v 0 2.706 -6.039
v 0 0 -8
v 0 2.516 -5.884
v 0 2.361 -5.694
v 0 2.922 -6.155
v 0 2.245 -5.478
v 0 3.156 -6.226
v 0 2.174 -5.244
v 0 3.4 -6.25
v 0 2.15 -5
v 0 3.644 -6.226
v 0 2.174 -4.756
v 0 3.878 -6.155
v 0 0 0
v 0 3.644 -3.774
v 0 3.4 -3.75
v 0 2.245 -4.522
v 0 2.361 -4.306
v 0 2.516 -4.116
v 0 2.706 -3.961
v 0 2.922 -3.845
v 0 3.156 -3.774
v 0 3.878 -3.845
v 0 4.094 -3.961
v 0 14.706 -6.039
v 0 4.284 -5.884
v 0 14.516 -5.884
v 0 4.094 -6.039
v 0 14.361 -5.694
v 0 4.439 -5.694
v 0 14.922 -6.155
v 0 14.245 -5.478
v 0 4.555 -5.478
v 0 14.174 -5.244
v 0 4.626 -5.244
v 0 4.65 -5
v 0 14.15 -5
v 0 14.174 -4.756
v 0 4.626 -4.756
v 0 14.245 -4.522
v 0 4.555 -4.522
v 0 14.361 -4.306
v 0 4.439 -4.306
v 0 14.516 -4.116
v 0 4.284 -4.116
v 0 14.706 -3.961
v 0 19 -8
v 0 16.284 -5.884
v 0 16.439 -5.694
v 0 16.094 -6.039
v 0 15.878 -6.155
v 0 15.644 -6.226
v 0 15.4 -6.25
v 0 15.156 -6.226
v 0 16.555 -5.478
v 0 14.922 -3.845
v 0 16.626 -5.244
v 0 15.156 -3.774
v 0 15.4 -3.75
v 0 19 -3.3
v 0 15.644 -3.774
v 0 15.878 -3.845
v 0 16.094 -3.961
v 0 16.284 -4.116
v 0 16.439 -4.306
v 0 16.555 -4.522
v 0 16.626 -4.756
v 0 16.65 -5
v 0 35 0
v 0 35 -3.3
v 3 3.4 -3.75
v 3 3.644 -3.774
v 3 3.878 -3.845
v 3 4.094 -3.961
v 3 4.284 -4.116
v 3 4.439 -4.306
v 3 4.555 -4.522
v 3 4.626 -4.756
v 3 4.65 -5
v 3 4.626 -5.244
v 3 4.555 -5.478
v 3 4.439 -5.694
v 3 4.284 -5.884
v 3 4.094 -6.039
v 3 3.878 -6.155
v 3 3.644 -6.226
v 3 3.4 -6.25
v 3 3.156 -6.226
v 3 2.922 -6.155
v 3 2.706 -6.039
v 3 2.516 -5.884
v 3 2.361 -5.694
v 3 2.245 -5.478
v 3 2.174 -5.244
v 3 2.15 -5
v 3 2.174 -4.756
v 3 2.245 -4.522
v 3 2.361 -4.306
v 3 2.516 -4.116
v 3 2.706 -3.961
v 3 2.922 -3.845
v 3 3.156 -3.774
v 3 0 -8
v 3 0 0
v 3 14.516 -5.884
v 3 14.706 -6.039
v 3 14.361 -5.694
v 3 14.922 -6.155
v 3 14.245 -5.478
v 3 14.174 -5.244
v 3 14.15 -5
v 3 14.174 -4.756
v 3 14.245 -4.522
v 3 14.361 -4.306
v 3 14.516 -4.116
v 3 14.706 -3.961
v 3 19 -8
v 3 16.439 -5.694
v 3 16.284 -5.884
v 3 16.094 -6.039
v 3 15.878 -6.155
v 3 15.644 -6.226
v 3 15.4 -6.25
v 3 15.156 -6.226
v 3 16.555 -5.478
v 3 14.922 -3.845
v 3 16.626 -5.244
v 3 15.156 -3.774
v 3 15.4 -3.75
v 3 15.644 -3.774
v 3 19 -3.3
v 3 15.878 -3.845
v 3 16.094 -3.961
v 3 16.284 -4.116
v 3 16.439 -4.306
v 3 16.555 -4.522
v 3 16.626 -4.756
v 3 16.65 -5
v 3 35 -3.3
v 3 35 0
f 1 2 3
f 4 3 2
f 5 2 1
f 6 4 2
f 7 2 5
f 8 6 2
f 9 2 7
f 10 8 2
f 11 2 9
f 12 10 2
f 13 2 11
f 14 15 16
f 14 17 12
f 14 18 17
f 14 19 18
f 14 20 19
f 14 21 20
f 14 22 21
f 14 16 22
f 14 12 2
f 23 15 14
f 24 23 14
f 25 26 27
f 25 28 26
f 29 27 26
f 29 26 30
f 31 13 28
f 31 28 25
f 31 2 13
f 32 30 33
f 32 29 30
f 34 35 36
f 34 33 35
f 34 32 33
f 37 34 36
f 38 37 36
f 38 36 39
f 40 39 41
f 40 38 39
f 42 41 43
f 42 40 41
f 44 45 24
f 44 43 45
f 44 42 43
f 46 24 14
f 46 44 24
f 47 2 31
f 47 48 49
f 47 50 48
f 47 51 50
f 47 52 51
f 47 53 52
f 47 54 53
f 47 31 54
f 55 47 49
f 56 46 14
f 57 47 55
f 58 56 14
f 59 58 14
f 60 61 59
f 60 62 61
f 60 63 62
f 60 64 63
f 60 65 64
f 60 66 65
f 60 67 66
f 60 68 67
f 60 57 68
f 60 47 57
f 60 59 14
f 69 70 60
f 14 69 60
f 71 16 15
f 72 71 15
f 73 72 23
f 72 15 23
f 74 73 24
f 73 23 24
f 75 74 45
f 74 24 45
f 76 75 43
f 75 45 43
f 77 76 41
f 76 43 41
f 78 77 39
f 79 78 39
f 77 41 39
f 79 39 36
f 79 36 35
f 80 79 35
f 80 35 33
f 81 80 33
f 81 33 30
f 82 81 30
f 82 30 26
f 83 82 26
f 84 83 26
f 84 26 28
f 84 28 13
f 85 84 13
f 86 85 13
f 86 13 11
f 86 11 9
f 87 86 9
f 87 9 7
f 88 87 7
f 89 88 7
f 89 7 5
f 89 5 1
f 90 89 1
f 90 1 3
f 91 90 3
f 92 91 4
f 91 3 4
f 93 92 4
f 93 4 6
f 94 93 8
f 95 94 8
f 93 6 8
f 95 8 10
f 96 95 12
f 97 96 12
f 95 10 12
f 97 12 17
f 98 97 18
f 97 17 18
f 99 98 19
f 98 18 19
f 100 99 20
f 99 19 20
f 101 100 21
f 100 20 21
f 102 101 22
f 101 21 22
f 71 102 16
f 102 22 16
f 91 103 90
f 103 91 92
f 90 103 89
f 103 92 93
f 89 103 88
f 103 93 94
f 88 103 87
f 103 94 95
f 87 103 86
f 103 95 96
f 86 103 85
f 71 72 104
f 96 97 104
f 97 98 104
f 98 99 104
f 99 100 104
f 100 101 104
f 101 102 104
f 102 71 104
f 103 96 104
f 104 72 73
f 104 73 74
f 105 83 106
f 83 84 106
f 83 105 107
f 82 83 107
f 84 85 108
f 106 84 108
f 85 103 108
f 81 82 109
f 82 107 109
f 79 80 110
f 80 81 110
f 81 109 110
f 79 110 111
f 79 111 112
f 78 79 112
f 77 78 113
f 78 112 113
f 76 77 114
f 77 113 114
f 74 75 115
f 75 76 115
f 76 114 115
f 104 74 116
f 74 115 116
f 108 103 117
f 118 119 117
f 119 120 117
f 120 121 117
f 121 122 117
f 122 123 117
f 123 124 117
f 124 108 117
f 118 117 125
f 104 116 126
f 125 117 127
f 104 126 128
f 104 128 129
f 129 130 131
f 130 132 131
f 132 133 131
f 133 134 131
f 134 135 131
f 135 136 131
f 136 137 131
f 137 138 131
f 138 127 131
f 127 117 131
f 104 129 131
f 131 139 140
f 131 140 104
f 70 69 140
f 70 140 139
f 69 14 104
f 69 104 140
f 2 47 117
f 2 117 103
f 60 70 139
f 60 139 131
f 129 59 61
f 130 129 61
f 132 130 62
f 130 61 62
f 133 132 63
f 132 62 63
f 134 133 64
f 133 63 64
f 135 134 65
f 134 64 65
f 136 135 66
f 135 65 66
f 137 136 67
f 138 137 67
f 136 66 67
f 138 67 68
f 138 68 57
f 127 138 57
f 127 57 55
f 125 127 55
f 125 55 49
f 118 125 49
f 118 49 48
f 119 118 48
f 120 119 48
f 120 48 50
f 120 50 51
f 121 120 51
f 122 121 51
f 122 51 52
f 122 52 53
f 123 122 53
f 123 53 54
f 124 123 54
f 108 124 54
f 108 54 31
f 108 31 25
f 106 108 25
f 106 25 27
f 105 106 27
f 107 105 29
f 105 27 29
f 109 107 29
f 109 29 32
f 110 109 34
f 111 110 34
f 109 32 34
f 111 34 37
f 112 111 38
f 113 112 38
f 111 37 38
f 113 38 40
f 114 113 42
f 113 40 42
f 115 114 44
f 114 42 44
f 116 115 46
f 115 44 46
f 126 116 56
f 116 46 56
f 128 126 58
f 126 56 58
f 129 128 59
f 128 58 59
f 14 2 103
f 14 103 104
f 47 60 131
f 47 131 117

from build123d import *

# Parameters (mm, degrees)
BOSS_EXTRUDE1_DEPTH             = 3
TAP_DRILL_FOR_M3X0_5_TAP1_D     = 2.5
TAP_DRILL_FOR_M3X0_5_TAP1_DEPTH = 3


with BuildPart() as part:
    # Sketch1 → Boss-Extrude1 (new body)
    with BuildSketch(Plane(origin=(0, 0, 0), x_dir=(0, 0, -1), z_dir=(1, 0, 0))):
        Polygon((0, 0), (0, 35), (3.3, 35), (3.3, 19), (8, 19), (8, 0), align=None)
    extrude(amount=BOSS_EXTRUDE1_DEPTH)

    # Tap Drill for M3x0.5 Tap1
    with Locations(Plane(origin=(3, 0, 0), x_dir=(0, 0, -1), z_dir=(1, 0, 0))):
        with Locations((5, 15.4), (5, 3.4)):
            Hole(TAP_DRILL_FOR_M3X0_5_TAP1_D / 2, depth=TAP_DRILL_FOR_M3X0_5_TAP1_DEPTH)


solid = part.part
